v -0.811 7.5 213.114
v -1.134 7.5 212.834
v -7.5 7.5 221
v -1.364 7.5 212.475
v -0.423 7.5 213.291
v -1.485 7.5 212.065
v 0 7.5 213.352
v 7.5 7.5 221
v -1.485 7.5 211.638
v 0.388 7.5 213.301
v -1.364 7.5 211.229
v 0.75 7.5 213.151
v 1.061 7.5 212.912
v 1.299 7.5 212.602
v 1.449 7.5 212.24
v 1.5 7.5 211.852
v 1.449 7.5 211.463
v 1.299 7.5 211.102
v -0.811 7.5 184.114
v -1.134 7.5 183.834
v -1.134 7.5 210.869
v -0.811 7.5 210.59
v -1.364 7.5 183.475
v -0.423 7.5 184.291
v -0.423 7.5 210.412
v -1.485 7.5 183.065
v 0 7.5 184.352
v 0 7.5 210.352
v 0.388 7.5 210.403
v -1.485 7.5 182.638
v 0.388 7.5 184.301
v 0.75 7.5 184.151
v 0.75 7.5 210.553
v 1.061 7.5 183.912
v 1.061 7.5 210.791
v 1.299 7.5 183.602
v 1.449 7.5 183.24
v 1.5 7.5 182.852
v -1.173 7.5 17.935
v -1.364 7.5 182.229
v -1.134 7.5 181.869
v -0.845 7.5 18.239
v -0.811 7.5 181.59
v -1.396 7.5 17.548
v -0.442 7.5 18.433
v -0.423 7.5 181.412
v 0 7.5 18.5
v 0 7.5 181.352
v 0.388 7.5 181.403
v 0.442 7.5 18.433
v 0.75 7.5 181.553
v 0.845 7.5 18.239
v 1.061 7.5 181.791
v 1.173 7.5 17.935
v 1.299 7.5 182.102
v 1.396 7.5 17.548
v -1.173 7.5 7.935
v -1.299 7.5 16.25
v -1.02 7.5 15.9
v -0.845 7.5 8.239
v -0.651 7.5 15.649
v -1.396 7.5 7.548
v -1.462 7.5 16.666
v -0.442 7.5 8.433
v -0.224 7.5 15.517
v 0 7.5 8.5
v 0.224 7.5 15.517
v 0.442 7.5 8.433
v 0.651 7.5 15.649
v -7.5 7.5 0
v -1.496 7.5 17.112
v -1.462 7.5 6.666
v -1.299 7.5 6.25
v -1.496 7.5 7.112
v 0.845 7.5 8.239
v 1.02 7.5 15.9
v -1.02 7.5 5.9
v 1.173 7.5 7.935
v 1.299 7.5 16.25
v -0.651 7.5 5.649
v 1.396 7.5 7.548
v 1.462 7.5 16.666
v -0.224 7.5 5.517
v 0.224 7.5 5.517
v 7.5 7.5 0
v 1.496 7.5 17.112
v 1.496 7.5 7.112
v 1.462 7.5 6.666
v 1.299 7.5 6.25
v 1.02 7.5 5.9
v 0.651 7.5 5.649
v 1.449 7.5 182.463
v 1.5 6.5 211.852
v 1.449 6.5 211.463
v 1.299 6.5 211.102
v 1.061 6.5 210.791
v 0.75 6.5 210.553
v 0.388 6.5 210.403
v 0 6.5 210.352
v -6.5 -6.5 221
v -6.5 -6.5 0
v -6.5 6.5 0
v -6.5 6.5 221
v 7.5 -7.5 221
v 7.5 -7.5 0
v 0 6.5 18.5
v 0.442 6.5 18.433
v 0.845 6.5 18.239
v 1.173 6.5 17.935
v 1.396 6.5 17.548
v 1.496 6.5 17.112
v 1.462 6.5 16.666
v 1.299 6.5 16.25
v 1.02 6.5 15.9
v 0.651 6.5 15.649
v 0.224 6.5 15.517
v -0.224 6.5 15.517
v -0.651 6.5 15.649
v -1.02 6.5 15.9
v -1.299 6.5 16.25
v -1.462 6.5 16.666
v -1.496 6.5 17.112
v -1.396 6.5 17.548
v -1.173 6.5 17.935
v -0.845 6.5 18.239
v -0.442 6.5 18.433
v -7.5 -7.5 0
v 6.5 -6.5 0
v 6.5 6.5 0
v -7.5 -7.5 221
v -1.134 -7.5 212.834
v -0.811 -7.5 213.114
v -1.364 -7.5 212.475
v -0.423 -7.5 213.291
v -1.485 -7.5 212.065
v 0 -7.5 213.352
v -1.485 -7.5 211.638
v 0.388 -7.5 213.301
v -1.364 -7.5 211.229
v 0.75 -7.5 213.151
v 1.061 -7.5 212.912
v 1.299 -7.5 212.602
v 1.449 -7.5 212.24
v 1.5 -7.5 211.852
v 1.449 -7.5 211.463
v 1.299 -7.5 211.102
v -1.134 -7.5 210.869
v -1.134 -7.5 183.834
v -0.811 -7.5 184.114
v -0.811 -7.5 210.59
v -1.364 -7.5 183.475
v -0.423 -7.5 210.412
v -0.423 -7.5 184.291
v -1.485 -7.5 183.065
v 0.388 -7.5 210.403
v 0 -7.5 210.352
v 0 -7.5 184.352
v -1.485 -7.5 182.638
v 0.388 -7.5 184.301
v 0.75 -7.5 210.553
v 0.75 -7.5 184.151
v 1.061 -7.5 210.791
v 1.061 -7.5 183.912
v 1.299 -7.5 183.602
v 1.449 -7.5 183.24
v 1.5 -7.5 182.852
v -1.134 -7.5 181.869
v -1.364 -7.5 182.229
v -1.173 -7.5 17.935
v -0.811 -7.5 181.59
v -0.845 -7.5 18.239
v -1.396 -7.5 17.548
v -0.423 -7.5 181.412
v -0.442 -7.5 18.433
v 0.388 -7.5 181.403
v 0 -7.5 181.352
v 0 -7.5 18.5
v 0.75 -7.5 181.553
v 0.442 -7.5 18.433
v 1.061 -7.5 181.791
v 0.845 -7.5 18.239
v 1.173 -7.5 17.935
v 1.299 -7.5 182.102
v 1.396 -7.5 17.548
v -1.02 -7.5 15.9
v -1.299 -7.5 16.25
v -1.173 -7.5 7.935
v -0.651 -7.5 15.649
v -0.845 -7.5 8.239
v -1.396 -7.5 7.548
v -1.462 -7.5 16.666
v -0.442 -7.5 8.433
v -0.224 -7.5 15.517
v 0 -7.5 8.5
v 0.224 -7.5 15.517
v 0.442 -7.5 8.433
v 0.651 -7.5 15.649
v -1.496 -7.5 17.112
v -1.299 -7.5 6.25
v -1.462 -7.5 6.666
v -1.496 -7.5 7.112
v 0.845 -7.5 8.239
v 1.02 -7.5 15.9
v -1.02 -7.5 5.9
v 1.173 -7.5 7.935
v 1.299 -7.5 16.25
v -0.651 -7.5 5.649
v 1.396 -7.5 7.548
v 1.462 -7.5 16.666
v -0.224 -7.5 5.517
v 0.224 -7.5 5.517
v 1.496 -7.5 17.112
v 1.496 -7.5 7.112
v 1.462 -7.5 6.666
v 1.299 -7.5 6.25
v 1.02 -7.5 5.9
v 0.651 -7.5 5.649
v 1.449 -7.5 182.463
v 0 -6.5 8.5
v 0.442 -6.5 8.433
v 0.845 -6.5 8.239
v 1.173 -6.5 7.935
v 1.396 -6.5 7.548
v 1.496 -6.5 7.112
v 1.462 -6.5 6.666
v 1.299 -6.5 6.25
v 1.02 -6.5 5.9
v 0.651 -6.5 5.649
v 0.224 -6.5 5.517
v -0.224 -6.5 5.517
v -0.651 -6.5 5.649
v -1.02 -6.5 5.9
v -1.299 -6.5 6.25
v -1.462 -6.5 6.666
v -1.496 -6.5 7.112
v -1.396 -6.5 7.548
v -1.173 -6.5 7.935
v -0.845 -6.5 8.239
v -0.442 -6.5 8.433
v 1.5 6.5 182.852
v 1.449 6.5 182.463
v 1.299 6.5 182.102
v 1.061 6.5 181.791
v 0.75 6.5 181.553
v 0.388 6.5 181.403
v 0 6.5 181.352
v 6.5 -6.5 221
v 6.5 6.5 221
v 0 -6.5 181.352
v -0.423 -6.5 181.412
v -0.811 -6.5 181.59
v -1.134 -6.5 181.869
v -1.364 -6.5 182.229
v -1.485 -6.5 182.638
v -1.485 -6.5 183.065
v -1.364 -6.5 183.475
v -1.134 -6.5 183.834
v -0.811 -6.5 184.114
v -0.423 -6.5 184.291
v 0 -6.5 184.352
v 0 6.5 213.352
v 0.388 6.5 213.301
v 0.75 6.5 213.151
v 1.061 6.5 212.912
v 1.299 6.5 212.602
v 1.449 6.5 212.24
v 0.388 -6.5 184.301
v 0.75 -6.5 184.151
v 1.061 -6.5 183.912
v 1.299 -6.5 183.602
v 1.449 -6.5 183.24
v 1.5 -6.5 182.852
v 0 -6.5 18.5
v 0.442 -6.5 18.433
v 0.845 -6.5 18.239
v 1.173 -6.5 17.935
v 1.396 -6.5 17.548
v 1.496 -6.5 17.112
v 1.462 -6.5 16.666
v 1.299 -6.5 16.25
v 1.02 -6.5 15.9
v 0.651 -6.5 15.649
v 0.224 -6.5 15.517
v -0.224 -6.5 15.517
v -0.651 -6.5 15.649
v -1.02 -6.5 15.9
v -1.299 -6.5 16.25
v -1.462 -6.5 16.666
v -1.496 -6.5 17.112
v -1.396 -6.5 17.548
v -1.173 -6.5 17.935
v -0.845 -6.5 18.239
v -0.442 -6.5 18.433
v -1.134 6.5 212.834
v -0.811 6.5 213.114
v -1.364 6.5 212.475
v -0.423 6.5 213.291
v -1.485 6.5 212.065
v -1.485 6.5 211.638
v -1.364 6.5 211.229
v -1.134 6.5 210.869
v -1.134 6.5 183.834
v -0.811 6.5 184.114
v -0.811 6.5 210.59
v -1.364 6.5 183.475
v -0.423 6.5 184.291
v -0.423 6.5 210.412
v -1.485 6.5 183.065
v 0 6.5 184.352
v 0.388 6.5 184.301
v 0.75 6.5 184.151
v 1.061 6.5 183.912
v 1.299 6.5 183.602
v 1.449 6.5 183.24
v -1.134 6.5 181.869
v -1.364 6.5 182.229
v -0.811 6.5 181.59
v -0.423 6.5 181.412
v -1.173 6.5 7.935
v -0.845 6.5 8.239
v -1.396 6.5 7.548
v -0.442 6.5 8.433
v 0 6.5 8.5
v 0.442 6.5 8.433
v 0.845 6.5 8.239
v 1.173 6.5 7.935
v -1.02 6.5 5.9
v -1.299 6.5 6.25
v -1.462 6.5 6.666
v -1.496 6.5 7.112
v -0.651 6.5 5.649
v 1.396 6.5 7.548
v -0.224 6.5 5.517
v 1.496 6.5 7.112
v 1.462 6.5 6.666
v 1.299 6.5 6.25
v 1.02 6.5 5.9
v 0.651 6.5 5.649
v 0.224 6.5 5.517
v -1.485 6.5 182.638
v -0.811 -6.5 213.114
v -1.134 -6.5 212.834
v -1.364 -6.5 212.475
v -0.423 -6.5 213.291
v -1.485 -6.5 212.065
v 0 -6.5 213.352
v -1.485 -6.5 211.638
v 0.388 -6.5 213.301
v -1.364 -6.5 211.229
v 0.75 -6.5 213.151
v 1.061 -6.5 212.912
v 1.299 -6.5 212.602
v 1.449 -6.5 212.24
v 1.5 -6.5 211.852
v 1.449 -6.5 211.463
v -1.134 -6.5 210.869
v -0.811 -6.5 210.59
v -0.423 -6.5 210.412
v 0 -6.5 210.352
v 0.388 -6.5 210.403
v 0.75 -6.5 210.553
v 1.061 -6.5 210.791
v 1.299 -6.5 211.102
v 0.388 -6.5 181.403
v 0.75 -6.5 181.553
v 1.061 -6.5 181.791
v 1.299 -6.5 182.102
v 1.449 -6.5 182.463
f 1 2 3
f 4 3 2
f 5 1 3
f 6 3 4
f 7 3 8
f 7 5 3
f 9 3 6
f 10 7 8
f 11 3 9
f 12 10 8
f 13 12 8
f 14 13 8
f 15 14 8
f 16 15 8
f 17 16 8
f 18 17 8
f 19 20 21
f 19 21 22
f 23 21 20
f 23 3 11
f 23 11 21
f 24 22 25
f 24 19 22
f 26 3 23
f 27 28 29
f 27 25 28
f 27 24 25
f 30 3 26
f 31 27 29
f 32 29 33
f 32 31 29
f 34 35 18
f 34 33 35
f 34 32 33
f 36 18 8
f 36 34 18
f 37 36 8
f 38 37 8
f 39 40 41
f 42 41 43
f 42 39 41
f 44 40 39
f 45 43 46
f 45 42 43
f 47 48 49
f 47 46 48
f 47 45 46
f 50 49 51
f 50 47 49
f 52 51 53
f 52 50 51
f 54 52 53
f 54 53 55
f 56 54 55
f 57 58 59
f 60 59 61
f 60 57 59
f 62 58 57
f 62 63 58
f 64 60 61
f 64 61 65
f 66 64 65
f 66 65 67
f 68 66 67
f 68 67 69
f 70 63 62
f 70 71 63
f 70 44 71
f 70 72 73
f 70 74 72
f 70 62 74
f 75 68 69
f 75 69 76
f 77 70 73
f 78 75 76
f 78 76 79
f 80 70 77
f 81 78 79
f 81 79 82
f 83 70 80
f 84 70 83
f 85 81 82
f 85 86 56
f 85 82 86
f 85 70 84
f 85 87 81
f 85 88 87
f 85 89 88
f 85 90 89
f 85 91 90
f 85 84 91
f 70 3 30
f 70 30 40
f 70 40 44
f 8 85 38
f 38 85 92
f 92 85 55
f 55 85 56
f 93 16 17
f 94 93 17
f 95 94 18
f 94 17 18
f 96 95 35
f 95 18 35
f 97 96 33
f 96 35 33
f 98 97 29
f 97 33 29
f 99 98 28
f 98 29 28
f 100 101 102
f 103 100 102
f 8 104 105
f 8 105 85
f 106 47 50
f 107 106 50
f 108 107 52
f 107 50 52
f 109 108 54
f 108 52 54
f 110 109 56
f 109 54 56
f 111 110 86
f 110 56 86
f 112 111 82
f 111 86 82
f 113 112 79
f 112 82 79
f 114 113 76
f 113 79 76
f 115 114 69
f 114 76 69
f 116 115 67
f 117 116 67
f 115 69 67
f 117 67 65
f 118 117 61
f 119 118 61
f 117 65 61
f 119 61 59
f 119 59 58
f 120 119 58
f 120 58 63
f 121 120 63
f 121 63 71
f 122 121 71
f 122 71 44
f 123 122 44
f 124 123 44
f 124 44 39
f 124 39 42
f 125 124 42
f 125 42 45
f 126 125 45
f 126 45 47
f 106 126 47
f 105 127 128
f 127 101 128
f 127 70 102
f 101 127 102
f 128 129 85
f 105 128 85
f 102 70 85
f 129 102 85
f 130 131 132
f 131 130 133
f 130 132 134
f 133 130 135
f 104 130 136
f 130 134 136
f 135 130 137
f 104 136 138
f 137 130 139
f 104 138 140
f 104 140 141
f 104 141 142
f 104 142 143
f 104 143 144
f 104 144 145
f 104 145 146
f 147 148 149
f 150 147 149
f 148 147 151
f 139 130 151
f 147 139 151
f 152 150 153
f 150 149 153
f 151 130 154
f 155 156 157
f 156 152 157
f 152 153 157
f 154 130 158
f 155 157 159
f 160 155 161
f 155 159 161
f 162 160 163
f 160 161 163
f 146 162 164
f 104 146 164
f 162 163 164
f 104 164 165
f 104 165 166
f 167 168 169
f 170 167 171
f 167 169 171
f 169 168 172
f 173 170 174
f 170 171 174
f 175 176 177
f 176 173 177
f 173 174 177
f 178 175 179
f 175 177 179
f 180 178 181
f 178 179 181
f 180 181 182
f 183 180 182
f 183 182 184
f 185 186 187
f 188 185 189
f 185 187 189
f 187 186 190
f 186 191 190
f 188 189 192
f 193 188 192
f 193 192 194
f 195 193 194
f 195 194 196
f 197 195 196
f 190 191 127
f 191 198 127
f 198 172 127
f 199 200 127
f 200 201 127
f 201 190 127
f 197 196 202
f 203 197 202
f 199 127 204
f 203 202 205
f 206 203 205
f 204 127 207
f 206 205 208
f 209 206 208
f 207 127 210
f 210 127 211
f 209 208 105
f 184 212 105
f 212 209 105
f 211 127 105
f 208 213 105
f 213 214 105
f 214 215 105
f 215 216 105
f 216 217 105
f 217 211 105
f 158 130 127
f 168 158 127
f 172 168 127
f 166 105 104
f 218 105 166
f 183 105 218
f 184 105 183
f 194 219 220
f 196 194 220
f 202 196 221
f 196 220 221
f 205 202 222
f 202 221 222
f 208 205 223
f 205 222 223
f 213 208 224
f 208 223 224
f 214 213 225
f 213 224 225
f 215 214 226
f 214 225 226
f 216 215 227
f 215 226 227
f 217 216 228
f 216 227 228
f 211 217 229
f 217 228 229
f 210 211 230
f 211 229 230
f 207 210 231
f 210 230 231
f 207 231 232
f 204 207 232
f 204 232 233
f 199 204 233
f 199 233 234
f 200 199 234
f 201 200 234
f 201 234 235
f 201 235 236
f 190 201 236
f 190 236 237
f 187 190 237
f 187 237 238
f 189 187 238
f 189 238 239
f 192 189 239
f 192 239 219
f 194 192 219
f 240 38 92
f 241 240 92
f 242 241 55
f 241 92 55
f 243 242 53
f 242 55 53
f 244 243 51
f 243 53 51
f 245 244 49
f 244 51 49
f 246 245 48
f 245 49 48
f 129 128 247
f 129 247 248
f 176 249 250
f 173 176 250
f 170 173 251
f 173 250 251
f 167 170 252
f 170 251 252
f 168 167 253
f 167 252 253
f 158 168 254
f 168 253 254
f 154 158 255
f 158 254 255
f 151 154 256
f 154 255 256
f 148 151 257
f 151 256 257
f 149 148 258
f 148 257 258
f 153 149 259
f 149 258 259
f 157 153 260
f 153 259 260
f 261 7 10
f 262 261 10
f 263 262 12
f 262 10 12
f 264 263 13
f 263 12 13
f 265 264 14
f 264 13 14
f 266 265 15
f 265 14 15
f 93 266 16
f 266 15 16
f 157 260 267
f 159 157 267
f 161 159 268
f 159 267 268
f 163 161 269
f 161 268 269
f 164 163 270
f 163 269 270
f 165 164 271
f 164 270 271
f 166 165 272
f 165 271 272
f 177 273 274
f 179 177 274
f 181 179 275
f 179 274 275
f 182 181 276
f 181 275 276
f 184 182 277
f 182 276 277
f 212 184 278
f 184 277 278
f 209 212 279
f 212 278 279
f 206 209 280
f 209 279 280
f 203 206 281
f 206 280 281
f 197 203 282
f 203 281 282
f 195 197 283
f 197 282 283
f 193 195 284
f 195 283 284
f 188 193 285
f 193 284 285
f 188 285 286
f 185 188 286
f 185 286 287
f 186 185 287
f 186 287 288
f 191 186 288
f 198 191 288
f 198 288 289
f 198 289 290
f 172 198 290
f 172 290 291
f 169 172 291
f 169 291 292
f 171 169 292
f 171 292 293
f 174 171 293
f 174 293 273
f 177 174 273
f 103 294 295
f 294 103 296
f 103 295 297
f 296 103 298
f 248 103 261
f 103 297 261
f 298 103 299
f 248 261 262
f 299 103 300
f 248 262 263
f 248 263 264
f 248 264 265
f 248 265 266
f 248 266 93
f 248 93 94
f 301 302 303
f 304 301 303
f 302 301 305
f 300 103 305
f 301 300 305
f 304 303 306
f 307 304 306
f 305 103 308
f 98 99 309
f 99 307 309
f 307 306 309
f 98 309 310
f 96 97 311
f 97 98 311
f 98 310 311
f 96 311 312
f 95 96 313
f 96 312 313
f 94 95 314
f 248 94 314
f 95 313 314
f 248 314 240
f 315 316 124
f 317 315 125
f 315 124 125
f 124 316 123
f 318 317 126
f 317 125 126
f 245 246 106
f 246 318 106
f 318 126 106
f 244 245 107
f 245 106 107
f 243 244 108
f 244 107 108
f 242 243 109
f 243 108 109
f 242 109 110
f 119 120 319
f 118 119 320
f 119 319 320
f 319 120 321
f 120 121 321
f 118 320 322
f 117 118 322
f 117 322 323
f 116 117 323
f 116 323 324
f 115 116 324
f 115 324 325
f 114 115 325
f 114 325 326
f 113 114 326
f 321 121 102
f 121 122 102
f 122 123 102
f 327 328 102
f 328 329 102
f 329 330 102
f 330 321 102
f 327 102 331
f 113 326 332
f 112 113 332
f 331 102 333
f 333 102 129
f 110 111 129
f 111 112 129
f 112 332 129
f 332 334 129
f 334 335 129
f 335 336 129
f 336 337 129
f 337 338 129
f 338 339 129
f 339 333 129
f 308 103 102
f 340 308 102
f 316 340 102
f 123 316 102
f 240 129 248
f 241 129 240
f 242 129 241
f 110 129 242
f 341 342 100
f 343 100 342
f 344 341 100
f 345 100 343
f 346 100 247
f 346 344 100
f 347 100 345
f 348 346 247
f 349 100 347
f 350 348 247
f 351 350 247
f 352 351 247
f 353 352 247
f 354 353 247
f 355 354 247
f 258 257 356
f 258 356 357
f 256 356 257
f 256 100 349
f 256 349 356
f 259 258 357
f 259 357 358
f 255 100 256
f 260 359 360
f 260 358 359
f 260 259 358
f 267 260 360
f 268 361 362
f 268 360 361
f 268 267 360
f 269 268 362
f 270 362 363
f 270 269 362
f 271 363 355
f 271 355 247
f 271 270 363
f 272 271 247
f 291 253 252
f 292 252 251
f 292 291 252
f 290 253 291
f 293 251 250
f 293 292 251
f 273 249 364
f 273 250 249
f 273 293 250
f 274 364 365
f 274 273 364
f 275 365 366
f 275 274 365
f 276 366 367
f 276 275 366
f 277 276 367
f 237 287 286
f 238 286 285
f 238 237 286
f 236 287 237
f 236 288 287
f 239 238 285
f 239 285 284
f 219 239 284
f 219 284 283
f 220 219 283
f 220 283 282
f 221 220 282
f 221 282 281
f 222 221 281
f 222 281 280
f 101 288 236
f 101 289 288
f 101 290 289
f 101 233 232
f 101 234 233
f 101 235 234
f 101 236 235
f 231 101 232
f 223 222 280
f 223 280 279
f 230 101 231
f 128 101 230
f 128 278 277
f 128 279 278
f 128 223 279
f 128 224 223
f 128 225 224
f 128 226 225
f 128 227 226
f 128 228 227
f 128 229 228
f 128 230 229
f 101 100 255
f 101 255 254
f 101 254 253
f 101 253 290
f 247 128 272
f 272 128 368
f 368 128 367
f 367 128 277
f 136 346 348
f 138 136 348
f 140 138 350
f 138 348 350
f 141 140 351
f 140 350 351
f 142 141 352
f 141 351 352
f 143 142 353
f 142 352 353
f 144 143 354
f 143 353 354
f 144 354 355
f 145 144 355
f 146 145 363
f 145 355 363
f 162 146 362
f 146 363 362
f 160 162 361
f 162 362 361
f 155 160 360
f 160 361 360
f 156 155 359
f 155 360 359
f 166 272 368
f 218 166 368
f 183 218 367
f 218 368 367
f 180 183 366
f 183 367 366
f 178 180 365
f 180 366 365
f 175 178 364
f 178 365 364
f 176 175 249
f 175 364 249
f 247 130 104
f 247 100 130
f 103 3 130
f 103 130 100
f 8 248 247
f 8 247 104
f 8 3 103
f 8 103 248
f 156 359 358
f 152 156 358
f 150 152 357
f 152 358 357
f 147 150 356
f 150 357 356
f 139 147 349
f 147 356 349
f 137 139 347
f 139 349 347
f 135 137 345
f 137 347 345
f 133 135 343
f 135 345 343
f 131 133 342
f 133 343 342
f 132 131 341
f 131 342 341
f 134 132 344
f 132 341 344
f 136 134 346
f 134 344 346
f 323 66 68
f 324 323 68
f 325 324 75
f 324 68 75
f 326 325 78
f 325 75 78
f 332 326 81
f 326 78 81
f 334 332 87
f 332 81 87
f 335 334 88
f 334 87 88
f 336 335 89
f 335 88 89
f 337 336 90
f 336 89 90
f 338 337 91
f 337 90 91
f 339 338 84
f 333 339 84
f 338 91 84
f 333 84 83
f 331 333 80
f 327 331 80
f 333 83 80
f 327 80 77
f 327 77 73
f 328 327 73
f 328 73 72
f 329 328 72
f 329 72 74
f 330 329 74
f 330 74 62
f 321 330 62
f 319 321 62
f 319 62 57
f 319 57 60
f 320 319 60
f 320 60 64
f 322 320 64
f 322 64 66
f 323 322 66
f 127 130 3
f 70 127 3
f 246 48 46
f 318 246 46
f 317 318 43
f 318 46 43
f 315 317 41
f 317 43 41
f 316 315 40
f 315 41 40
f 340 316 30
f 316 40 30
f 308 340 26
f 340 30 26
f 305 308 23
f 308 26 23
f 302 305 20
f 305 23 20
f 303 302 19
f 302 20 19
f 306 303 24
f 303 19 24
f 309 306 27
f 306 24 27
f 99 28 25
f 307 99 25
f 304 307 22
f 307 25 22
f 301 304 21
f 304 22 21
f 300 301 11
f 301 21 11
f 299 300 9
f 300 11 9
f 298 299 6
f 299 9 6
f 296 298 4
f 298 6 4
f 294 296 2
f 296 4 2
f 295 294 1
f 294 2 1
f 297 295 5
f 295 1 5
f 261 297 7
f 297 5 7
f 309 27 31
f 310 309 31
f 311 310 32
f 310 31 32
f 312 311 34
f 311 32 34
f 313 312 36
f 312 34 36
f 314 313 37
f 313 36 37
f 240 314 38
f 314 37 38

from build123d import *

# Parameters (mm, degrees)
SKETCH1_W           = 15
SKETCH1_H           = 15
SKETCH1_W_2         = 13
SKETCH1_H_2         = 13
BOSS_EXTRUDE1_DEPTH = 221
SKETCH4_R           = 1.5
CUT_EXTRUDE1_DEPTH  = 26
SKETCH5_R           = 1.5
CUT_EXTRUDE2_DEPTH  = 34


with BuildPart() as part:
    # Sketch1 → Boss-Extrude1 (new body)
    with BuildSketch(Plane.XY):
        Rectangle(SKETCH1_W, SKETCH1_H)
        Rectangle(SKETCH1_W_2, SKETCH1_H_2, mode=Mode.SUBTRACT)
    extrude(amount=BOSS_EXTRUDE1_DEPTH)

    # Sketch4 → Cut-Extrude1 (cut)
    with BuildSketch(Plane(origin=(0, 7.5, 0), x_dir=(1, 0, 0), z_dir=(0, 1, 0))):
        with Locations((0, -7)):
            Circle(SKETCH4_R)
        with Locations((0, -17)):
            Circle(SKETCH4_R)
    extrude(amount=-CUT_EXTRUDE1_DEPTH, mode=Mode.SUBTRACT)

    # Sketch5 → Cut-Extrude2 (cut)
    with BuildSketch(Plane(origin=(0, 7.5, 0), x_dir=(1, 0, 0), z_dir=(0, 1, 0))):
        with Locations((0, -182.85171377)):
            Circle(SKETCH5_R)
        with Locations((0, -211.85171377)):
            Circle(SKETCH5_R)
    extrude(amount=-CUT_EXTRUDE2_DEPTH, mode=Mode.SUBTRACT)


solid = part.part
